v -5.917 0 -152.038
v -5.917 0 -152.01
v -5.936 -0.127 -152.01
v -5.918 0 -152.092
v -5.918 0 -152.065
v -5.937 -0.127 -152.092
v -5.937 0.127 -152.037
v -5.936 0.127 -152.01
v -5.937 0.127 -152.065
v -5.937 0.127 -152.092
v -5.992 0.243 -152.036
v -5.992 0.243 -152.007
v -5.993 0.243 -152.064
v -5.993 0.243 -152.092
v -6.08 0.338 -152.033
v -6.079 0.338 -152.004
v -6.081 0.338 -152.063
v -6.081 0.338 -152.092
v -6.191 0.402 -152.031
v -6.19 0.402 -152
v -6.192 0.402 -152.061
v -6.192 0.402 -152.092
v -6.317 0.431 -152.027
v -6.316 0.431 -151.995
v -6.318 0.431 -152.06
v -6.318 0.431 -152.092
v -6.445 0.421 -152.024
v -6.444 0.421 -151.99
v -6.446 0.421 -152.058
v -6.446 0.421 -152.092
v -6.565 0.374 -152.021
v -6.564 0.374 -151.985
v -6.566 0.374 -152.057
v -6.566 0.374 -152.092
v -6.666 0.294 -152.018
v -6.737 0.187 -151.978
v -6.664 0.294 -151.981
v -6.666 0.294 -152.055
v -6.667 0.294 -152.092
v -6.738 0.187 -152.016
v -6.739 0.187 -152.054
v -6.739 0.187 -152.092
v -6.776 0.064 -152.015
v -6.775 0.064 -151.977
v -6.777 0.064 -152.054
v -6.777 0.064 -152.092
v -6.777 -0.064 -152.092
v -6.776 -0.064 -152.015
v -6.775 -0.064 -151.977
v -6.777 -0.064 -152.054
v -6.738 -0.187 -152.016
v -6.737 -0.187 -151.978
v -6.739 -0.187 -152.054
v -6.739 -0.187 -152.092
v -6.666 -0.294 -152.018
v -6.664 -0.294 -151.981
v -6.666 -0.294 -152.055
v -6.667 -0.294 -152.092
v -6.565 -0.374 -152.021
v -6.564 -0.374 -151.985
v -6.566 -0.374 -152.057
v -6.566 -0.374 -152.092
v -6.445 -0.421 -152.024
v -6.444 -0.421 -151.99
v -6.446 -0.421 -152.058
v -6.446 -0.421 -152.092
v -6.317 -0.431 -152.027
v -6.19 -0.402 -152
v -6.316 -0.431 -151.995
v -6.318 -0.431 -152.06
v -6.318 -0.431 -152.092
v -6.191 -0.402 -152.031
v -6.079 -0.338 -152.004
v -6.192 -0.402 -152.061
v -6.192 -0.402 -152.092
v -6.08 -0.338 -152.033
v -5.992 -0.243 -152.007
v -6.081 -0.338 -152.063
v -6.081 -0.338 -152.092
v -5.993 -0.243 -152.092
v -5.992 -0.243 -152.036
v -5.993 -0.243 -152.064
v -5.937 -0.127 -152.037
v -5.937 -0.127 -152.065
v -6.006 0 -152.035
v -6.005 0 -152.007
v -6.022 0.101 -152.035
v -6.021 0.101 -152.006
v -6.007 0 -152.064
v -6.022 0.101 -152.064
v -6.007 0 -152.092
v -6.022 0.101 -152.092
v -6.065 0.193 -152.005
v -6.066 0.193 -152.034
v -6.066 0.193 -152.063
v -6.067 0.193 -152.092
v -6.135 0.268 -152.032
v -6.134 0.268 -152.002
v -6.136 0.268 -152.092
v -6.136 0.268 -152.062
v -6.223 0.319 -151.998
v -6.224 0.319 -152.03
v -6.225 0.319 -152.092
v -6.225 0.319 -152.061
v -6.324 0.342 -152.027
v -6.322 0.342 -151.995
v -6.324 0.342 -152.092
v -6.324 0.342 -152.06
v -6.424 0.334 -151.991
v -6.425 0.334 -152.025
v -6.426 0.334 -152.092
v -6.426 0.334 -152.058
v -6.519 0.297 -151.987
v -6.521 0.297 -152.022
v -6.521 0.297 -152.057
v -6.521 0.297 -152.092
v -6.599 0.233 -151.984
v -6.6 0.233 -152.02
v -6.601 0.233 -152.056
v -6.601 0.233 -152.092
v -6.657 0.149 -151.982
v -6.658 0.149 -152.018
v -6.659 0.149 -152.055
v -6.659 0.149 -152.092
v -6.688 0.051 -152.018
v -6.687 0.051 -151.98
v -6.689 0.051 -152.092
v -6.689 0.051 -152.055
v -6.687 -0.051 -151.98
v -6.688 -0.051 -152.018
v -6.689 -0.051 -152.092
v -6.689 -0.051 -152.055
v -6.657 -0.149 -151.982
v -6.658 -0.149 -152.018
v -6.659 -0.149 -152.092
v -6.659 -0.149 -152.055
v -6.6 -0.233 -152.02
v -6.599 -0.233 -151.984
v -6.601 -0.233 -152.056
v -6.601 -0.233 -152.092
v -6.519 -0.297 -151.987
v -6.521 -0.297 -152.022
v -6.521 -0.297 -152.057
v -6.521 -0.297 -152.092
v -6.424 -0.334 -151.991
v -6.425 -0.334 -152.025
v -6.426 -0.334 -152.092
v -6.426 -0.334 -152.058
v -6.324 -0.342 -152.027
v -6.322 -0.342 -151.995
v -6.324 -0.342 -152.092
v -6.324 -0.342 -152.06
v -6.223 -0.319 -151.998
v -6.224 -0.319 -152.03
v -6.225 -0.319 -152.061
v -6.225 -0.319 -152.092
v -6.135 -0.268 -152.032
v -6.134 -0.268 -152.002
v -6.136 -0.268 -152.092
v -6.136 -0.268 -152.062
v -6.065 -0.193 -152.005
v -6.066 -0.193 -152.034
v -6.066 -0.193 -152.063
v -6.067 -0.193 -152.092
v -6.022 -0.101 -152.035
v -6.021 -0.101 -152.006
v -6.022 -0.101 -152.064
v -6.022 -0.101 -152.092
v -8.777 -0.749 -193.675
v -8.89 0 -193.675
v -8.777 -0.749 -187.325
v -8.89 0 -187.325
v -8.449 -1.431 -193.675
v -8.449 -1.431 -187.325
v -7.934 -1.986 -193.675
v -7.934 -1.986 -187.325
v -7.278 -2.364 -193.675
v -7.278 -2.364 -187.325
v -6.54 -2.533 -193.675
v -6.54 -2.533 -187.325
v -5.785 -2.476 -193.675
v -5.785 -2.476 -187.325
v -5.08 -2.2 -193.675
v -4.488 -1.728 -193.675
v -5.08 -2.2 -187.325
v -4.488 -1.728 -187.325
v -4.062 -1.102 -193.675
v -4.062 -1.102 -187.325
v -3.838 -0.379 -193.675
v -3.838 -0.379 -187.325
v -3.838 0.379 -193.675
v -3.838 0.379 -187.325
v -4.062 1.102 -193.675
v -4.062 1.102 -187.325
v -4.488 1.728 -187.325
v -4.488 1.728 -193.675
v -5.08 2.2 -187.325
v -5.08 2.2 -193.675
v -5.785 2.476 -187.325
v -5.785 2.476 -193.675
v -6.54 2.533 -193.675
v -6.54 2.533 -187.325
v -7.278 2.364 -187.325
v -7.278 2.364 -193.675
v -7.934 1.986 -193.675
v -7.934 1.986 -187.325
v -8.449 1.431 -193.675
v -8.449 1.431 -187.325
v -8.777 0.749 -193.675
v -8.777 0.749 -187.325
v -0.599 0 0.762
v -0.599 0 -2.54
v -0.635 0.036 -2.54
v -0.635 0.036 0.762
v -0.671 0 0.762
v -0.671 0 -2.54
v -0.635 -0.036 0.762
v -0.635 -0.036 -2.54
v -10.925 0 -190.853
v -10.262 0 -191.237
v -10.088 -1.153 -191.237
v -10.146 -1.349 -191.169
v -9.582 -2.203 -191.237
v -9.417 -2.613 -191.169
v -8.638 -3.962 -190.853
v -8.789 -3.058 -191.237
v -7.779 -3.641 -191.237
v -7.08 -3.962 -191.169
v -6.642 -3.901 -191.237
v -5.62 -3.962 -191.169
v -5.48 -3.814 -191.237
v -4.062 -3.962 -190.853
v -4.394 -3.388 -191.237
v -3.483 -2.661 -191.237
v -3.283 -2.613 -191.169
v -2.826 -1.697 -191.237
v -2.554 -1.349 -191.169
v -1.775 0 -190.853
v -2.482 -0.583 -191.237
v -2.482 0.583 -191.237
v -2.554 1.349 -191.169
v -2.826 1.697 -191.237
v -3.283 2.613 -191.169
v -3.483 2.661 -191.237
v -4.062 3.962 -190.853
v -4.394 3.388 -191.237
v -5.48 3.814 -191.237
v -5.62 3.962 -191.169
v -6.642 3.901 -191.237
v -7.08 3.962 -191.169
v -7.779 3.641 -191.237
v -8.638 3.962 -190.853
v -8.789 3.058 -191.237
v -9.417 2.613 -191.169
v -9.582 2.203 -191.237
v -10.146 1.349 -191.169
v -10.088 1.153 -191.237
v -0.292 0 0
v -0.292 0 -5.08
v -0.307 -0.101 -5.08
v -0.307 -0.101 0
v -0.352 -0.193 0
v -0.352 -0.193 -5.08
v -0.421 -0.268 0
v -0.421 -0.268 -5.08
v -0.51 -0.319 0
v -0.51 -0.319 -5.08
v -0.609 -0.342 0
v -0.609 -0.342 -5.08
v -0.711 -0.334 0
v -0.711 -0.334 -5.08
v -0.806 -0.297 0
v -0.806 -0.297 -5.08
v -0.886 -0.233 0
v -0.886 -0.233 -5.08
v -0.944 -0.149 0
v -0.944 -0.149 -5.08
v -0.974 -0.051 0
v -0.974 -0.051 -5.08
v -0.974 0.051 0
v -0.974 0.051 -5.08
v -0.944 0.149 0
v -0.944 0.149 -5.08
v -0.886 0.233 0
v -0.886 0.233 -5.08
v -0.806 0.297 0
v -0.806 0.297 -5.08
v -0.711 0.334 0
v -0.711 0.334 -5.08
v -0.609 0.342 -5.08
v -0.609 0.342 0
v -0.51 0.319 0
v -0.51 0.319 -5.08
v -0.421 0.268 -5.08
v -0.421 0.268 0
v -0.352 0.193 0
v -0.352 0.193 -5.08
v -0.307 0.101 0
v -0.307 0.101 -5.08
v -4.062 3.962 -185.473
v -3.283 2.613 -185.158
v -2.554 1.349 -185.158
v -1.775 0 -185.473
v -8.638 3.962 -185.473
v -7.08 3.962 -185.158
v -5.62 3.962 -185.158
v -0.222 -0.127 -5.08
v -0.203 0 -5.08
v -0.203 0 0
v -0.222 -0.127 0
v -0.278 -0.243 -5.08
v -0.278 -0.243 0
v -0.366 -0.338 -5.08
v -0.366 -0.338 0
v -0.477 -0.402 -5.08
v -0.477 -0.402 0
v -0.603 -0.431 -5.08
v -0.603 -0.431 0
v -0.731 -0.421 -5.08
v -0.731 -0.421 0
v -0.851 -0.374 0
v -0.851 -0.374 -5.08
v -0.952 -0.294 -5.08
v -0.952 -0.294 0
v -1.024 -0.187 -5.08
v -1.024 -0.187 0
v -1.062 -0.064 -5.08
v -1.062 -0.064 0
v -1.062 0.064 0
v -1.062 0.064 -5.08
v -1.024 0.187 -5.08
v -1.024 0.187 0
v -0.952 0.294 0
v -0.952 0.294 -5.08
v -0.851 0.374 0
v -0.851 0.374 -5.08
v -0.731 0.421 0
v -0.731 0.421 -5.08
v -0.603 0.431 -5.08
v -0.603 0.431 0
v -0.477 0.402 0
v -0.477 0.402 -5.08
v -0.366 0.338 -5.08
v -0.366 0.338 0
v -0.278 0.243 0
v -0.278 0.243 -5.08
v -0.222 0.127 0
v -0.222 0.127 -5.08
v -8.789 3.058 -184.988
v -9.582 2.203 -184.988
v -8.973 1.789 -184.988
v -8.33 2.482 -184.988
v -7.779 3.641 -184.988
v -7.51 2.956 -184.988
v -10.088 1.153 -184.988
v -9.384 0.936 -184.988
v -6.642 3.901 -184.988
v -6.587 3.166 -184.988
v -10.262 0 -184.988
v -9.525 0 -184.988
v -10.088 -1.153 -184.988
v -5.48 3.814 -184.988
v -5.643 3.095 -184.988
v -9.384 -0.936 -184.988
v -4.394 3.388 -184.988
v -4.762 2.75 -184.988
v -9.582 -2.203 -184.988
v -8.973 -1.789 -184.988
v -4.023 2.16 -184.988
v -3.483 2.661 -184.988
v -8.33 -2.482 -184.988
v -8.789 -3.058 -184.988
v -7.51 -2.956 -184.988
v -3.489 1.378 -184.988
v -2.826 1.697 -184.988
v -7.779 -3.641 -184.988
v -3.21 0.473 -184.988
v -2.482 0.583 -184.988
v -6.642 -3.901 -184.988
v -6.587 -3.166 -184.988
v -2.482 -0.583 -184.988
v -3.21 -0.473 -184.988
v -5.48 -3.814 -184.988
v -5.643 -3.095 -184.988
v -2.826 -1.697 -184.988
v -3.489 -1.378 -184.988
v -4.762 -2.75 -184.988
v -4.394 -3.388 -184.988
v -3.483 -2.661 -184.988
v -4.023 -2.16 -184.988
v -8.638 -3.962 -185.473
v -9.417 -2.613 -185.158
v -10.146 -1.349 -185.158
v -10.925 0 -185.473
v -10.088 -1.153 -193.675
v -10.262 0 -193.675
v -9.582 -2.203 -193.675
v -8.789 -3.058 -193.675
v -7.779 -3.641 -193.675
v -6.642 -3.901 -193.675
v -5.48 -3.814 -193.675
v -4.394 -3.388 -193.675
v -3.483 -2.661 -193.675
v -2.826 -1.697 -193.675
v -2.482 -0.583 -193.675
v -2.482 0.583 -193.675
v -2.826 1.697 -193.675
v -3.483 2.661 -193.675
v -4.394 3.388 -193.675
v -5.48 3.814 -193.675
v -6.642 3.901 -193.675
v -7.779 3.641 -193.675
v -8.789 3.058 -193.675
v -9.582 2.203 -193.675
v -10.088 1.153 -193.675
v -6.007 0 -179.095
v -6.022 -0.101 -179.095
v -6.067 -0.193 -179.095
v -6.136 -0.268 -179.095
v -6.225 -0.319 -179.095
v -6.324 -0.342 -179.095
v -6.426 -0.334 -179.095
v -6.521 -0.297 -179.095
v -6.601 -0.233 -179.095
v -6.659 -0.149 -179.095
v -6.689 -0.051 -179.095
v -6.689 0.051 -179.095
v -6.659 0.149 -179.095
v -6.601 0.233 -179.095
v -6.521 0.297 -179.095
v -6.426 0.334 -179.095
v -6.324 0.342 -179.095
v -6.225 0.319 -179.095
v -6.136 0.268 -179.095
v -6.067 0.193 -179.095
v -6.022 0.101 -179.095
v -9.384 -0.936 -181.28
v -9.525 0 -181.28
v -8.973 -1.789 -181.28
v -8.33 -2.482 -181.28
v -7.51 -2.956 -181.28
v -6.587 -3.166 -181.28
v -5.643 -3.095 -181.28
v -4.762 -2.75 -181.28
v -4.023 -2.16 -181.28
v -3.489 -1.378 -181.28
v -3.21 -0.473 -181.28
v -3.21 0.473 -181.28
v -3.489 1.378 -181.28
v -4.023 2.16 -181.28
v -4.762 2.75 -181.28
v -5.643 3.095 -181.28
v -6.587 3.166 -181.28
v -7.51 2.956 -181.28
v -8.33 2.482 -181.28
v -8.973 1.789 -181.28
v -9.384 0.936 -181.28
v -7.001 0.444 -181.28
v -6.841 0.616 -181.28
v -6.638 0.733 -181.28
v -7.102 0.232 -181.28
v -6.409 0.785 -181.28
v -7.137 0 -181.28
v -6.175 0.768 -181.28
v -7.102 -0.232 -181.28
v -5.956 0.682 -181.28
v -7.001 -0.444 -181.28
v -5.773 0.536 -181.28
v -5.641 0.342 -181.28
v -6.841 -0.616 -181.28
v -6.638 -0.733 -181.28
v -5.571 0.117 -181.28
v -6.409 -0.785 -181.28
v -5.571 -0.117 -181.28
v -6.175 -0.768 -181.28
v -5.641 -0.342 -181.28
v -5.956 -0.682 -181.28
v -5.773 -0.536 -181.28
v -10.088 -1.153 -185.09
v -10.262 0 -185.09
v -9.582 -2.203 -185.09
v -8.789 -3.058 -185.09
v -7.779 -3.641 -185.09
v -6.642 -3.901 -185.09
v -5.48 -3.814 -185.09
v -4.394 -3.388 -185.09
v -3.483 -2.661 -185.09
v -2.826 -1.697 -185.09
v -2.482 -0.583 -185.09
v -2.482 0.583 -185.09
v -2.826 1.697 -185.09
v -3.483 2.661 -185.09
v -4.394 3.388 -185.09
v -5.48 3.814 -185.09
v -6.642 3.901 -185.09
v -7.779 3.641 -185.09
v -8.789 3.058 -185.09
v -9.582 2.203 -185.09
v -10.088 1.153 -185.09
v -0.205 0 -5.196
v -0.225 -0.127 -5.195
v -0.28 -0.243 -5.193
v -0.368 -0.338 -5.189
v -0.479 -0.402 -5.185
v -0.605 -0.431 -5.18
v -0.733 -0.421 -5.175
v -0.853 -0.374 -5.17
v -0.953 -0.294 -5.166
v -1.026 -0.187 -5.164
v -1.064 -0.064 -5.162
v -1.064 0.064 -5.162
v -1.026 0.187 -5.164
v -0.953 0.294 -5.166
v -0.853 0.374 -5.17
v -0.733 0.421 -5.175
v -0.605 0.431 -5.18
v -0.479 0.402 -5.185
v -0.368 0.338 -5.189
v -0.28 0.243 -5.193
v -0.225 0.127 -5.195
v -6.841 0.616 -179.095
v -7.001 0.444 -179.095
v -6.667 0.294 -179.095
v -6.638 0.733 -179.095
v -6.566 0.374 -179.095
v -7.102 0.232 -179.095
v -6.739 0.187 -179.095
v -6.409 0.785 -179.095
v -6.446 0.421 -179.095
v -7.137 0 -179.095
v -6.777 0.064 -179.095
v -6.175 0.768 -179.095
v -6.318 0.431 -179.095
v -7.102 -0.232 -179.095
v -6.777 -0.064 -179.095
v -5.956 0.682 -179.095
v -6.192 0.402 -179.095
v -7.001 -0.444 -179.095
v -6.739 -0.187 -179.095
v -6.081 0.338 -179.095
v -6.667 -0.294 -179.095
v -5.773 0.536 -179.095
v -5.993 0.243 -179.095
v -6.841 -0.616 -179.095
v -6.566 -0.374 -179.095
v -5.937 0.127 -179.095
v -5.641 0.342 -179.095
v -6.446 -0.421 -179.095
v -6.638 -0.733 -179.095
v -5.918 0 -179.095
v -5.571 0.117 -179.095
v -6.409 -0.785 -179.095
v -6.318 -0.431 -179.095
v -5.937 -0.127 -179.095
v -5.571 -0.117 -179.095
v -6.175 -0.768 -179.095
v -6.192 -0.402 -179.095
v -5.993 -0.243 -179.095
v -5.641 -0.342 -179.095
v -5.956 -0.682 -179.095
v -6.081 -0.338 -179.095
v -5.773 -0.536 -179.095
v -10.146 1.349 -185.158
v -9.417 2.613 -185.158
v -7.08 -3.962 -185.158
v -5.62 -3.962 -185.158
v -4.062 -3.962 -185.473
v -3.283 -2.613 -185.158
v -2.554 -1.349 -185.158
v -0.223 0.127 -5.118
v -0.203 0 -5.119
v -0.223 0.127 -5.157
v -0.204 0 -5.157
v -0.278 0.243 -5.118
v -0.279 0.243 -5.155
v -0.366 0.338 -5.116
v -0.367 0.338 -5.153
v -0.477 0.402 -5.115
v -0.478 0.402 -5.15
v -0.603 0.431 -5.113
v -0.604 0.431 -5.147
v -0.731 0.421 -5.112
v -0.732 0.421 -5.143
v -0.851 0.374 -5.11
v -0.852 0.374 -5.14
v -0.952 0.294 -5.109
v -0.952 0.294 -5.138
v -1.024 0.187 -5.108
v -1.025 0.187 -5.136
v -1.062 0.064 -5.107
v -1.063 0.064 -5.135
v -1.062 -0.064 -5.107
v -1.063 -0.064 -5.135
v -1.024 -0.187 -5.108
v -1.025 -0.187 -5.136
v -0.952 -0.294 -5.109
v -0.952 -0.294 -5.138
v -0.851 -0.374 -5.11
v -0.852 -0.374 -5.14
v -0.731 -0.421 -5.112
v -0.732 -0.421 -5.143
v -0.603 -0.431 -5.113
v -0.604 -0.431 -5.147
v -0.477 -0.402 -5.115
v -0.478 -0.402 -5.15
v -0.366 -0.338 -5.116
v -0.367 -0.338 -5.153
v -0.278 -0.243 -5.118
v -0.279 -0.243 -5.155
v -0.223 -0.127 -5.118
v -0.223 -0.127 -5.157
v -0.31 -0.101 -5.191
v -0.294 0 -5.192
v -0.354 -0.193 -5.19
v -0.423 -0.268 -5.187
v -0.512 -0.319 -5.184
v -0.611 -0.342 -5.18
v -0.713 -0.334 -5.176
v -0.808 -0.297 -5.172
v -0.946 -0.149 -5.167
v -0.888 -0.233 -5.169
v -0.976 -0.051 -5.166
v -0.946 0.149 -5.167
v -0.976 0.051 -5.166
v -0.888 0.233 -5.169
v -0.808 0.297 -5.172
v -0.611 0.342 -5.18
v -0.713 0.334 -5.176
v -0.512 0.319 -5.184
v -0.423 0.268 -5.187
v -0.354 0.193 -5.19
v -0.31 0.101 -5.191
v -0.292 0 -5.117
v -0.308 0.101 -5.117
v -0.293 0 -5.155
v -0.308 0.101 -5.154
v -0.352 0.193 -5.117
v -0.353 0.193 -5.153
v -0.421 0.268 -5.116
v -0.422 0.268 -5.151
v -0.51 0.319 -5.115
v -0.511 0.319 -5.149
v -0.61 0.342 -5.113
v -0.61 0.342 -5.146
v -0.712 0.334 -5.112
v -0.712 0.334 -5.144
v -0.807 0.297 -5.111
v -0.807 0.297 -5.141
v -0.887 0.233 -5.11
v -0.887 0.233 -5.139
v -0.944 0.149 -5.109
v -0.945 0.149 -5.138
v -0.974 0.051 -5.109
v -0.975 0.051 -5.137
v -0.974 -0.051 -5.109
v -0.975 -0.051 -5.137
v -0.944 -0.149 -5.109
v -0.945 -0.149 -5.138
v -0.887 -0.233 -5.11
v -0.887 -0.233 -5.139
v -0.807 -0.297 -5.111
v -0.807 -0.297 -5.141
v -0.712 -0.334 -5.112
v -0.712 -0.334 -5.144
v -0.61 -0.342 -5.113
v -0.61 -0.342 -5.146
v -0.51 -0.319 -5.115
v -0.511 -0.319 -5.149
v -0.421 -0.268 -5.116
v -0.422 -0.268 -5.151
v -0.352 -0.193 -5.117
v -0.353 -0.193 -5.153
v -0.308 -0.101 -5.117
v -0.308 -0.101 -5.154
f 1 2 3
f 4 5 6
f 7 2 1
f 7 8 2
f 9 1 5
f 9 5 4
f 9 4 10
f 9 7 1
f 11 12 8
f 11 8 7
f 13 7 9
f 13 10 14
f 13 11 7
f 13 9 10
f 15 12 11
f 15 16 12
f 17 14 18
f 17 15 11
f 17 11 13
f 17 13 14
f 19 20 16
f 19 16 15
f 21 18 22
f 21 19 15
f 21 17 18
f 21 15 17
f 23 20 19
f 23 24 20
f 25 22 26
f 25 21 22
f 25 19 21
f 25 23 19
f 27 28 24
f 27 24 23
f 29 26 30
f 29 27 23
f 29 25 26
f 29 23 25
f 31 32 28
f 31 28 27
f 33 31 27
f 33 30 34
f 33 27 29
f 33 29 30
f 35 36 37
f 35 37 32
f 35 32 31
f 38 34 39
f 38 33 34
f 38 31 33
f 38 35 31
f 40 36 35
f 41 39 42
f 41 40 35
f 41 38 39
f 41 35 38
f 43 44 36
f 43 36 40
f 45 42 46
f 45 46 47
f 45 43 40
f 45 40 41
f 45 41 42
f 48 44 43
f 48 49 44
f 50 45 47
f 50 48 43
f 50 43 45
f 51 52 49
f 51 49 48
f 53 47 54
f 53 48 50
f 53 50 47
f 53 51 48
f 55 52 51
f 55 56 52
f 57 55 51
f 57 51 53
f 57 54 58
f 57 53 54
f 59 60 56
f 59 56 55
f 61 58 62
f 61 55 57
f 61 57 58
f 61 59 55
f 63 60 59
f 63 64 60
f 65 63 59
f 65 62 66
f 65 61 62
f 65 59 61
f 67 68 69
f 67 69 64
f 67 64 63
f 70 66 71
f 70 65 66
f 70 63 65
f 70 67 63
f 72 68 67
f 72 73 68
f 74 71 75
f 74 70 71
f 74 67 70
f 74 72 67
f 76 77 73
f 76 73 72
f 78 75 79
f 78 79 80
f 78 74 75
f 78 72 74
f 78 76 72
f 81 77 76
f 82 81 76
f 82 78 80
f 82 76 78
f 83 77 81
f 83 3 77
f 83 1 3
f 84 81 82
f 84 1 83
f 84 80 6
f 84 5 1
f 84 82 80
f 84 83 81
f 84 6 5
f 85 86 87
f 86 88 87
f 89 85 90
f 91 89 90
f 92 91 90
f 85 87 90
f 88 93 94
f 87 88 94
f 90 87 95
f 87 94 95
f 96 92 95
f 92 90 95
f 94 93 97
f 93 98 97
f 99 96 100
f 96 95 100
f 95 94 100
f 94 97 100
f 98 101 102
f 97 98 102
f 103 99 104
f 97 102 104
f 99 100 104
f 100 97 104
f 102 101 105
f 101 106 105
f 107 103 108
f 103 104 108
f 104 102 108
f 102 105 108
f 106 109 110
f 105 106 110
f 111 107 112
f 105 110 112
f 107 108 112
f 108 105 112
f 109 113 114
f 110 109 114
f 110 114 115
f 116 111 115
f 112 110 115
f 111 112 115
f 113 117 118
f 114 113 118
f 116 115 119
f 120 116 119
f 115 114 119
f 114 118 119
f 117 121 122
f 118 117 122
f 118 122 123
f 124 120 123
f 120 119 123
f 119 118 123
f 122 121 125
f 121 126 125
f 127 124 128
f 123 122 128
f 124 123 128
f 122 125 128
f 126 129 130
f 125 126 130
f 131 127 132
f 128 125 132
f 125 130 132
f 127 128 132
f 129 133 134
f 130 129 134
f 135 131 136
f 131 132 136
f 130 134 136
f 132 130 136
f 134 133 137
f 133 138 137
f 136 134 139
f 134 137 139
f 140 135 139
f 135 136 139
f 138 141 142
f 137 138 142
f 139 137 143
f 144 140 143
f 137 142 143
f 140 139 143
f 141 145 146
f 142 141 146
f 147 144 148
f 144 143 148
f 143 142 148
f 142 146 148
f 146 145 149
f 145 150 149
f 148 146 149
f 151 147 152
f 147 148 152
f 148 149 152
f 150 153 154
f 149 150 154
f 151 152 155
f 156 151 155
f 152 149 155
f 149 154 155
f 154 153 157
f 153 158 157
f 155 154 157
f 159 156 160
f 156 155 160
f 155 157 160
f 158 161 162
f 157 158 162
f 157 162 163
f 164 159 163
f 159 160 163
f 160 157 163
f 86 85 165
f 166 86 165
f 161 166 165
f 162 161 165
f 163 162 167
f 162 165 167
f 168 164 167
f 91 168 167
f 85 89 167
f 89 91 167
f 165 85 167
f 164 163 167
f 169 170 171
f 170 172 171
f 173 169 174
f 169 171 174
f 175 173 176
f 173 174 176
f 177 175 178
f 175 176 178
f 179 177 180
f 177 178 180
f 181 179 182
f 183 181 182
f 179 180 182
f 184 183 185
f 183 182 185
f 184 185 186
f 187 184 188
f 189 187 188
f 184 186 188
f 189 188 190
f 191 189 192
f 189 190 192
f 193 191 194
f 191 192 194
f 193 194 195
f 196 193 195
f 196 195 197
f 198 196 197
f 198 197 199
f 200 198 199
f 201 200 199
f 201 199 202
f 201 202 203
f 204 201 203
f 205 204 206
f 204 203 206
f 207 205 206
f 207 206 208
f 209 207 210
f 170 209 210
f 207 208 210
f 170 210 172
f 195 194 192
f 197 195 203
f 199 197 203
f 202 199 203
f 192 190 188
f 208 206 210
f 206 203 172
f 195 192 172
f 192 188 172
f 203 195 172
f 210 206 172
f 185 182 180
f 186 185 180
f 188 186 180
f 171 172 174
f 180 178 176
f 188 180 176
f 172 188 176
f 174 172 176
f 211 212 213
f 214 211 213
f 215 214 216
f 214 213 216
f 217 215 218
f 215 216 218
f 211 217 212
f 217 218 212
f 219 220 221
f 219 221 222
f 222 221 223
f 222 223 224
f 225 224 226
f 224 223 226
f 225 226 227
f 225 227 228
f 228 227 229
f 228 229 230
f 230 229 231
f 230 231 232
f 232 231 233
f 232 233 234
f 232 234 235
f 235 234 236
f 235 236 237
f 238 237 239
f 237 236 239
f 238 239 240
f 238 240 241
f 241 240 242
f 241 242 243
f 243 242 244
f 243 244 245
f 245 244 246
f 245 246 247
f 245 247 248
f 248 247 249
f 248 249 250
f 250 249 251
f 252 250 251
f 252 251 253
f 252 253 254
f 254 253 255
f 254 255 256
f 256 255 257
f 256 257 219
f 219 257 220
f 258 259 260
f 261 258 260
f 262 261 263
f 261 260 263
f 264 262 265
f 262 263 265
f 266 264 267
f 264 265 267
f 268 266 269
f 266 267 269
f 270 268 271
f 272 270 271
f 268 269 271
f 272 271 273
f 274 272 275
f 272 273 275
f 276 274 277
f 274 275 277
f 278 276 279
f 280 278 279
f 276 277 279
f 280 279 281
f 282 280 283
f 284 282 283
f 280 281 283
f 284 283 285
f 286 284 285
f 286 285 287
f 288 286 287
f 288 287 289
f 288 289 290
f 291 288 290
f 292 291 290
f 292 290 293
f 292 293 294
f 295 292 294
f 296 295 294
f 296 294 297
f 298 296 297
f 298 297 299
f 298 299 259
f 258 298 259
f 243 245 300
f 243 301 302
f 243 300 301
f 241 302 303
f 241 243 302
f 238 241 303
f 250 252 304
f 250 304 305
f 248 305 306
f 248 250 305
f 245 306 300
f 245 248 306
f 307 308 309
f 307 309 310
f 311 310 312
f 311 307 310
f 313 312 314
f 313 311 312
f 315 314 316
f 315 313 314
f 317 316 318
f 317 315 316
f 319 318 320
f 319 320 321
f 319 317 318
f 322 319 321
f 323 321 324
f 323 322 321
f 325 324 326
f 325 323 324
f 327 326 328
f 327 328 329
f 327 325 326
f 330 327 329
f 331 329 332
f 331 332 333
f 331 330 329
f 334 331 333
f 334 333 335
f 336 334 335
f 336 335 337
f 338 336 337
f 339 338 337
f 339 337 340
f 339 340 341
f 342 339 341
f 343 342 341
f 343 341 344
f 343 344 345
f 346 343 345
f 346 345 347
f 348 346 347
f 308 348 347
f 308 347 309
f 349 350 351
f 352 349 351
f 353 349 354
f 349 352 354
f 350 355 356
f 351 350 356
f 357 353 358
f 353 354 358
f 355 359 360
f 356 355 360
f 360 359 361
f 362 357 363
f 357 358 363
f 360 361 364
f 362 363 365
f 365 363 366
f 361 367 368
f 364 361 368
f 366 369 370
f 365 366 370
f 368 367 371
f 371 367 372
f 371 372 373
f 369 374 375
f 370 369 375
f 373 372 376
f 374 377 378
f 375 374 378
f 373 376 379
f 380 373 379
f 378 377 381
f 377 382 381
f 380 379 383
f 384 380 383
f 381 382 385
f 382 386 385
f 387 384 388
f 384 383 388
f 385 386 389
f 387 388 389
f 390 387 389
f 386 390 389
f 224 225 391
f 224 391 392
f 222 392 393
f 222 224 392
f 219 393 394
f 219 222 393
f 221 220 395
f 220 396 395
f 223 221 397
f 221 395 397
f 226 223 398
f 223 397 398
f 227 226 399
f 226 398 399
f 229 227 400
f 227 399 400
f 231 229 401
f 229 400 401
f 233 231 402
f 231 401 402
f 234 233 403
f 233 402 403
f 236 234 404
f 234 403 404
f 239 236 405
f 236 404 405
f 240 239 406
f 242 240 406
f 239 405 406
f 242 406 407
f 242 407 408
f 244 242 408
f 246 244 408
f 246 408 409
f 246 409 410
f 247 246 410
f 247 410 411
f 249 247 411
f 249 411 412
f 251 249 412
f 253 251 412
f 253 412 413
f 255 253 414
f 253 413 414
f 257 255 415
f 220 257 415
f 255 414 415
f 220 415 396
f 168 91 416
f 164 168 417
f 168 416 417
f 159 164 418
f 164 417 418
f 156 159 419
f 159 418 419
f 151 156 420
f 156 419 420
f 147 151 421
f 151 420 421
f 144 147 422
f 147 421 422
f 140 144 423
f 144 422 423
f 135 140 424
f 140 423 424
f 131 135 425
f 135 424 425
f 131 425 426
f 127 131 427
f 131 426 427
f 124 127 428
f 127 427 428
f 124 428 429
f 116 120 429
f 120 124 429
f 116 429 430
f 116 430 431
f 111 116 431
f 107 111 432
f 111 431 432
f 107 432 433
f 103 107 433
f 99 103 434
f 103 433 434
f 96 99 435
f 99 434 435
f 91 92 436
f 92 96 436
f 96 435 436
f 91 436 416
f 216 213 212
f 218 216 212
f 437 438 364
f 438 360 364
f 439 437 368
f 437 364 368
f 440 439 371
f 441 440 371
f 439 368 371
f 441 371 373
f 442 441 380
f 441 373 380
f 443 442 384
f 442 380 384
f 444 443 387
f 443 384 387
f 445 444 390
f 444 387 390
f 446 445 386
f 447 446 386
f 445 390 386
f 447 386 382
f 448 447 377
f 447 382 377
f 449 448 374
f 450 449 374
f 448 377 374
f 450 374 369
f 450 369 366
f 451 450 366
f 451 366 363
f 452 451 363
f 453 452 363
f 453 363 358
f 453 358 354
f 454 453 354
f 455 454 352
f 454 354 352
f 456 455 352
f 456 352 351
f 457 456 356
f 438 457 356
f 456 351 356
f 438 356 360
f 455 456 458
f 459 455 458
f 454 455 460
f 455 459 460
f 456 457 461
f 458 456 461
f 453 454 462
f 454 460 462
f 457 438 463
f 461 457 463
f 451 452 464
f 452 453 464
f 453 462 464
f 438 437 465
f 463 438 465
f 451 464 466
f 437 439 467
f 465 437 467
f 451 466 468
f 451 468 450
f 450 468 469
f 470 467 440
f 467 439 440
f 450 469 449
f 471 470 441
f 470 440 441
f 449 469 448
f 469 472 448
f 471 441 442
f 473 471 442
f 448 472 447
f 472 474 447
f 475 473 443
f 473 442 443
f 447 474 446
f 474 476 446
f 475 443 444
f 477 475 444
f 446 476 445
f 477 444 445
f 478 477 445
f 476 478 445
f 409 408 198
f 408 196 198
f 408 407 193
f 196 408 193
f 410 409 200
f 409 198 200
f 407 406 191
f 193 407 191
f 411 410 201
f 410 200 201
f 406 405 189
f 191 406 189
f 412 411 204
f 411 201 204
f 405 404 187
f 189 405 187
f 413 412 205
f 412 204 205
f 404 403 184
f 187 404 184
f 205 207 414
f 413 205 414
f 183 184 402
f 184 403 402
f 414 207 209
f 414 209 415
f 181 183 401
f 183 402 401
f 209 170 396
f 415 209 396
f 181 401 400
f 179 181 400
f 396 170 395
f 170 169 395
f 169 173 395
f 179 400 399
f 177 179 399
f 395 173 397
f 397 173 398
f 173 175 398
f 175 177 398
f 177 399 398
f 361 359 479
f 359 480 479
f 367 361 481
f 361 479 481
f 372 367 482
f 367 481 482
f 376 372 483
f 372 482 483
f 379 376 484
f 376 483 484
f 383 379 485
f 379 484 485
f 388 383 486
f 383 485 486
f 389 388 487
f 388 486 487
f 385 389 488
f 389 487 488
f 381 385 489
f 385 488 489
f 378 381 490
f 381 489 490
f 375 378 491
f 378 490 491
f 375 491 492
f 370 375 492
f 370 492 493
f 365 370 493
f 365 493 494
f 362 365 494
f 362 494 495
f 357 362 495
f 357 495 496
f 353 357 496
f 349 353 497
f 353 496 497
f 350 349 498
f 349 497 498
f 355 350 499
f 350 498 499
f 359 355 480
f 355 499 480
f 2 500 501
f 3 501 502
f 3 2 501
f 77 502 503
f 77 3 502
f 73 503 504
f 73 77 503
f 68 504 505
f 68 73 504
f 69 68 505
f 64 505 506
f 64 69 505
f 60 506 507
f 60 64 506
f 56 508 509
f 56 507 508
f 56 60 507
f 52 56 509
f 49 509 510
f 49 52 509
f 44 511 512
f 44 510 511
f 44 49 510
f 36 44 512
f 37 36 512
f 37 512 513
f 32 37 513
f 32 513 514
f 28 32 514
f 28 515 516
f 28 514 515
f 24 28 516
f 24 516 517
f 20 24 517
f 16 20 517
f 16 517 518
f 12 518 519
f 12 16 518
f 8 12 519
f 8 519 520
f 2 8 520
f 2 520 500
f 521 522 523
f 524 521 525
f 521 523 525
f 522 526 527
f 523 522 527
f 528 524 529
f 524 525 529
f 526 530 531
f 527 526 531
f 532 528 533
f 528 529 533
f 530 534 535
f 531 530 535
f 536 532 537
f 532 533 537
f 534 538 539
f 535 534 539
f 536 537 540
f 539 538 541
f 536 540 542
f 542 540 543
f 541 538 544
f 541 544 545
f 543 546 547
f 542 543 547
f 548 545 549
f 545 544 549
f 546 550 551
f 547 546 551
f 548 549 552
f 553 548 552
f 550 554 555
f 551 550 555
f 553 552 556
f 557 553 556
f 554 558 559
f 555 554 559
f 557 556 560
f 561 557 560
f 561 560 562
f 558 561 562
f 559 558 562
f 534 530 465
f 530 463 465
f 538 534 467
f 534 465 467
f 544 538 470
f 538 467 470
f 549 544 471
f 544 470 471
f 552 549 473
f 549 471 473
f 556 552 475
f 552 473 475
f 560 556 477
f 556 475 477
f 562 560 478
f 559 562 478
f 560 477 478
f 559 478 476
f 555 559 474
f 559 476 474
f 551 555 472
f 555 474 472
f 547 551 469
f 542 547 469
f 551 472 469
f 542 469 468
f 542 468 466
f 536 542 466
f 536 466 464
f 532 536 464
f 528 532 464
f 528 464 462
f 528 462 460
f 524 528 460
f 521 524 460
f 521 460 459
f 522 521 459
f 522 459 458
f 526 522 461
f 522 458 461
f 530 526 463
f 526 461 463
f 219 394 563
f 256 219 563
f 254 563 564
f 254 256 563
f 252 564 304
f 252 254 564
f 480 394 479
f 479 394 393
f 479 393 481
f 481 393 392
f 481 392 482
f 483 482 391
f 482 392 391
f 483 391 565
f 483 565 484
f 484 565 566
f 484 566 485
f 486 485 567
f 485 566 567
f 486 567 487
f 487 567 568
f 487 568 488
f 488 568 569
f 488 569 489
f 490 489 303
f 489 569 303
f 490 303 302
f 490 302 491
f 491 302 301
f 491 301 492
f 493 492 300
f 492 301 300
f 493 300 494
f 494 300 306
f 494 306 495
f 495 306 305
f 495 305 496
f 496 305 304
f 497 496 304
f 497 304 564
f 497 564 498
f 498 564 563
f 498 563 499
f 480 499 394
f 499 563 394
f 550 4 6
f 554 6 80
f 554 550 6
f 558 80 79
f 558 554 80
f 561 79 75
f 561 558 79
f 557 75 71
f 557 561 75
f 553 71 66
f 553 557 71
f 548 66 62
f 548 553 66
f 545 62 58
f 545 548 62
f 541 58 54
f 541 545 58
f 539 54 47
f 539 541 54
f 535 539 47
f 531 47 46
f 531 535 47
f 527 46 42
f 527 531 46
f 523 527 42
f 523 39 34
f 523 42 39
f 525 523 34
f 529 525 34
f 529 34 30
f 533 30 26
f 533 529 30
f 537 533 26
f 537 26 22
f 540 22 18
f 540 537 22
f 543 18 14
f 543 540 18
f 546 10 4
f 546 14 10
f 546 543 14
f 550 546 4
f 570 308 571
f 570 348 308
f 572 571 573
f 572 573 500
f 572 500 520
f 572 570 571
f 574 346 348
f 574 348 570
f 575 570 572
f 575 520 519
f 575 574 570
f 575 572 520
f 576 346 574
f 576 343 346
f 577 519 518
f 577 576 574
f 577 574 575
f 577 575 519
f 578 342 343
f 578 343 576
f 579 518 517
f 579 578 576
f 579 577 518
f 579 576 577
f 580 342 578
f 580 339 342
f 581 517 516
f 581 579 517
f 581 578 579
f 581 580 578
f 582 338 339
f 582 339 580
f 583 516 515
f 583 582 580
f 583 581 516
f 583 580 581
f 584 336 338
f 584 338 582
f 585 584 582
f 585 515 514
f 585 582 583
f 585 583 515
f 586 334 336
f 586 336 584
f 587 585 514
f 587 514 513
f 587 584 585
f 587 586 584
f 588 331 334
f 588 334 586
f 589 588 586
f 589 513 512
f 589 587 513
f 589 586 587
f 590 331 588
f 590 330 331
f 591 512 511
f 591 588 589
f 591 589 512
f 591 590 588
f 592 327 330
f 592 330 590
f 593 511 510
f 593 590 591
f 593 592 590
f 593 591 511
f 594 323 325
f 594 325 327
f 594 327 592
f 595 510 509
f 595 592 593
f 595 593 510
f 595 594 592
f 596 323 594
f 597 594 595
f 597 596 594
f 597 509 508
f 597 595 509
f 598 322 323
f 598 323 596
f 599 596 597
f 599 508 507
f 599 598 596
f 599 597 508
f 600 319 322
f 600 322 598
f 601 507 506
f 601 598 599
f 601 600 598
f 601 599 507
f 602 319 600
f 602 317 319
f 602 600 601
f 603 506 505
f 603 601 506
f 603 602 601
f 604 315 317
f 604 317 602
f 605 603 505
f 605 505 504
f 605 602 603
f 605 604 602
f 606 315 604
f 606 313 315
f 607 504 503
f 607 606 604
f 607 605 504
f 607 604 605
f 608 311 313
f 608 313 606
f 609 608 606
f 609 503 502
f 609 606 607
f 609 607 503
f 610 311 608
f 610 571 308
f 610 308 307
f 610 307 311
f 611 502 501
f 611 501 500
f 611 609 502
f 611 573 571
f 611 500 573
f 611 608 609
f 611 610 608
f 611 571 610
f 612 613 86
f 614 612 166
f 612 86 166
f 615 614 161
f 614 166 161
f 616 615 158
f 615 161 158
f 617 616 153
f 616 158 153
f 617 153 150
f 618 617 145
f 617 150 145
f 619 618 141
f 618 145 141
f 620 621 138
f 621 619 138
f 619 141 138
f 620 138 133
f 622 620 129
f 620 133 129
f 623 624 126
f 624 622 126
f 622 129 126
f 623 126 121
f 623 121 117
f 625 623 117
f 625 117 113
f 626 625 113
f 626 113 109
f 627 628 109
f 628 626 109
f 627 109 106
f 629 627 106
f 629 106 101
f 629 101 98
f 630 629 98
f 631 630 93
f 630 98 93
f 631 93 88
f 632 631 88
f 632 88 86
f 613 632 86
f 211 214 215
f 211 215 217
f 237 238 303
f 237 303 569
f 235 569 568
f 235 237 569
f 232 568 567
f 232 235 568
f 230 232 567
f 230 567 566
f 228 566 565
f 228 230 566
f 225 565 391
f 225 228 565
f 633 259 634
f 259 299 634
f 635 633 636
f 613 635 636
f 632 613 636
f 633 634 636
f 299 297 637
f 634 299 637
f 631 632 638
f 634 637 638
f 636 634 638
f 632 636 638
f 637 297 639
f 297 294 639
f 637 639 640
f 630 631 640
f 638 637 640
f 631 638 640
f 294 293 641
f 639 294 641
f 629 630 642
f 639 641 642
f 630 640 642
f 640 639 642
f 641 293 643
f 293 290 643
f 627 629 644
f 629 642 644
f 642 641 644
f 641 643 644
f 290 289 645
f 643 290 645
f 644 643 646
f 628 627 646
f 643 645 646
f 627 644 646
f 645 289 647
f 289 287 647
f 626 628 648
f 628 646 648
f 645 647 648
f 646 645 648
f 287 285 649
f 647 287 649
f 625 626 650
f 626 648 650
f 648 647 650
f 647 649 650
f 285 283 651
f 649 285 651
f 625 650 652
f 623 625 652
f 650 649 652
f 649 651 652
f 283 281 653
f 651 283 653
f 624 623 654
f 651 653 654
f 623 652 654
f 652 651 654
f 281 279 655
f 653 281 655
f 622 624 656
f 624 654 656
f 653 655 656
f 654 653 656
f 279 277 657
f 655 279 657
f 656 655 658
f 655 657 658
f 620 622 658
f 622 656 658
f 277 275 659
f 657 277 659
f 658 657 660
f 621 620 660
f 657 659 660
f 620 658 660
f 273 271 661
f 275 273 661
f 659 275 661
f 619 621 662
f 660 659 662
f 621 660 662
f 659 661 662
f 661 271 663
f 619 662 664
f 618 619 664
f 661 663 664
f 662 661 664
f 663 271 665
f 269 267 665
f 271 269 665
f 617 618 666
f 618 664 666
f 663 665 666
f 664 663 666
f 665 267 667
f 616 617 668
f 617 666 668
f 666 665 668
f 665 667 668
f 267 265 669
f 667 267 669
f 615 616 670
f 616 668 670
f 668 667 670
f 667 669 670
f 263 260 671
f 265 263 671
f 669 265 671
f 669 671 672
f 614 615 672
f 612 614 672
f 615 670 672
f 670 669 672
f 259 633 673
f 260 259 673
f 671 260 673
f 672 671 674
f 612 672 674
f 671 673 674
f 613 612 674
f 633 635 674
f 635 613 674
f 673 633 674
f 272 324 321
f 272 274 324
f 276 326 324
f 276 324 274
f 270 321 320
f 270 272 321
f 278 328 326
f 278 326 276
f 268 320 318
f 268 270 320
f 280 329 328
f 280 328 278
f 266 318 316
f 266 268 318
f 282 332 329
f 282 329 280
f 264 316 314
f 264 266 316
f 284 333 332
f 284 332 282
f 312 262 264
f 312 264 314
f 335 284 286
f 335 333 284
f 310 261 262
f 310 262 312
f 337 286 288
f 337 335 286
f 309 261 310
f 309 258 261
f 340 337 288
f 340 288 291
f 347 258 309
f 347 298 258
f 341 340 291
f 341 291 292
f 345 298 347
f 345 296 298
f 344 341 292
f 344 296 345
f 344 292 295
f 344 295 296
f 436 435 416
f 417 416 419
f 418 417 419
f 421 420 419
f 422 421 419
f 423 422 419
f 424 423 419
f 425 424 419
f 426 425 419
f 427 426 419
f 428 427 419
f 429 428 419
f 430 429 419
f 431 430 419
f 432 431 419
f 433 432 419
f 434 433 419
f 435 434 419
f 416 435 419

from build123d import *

# Parameters (mm, degrees)
SKETCH1_R                     = 0.4318000000000002
SKETCH1_R_2                   = 0.3429000000000006
CE_00_CONNECTOR_HEX_CUT_REACH = 196.066
SKETCH4_R                     = 5.293177826238989
BE_00_PIN_LNA_END_DEPTH       = 0.762
BE_00_PIN_LNA_END_DEPTH_BACK  = 2.54
SKETCH5_R                     = 0.03555999999999999


with BuildPart() as part:
    # SW-00 Jacket & Layout: sweep along a path in Sketch2
    with BuildLine(Plane(origin=(0, 0, 0), x_dir=(1, 0, 0), z_dir=(0, 1, 0))) as sw_00_jacket_layout_path:
        Line((-0.635, 0), (-0.635, 5.08))
        ThreePointArc((-0.635, 5.08), (-0.6354799554172685, 5.129375532022666), (-0.6369196402854498, 5.178732404160234))
        Line((-0.6369196402854498, 5.178732404160234), (-6.348080359714551, 151.99360009067468))
        ThreePointArc((-6.348080359714551, 151.99360009067468), (-6.349520044582732, 152.04295696281224), (-6.35, 152.0923324948349))
        Line((-6.35, 152.0923324948349), (-6.349999999999999, 181.27980002776076))
    # Sketch1 → SW-00 Jacket & Layout (sweep)
    with BuildSketch(Plane.XY):
        with Locations((-0.635, 0)):
            Circle(SKETCH1_R)
        with Locations((-0.635, 0)):
            Circle(SKETCH1_R_2, mode=Mode.SUBTRACT)
    sweep(path=sw_00_jacket_layout_path.line)

    # Sketch3 → BR-00 Connector Body (revolve)
    with BuildSketch(Plane(origin=(0, 0, 0), x_dir=(1, 0, 0), z_dir=(0, 1, 0)), mode=Mode.PRIVATE) as br_00_connector_body_sk:
        Polygon((-6.349999999999998, 179.09539999999998), (-5.562599999999998, 179.09539999999998), (-5.562599999999998, 181.2798), (-3.174999999999998, 181.2798), (-3.174999999999998, 184.98819999999998), (-2.4383999999999992, 184.98819999999998), (-2.4383999999999992, 185.08979999999997), (-1.4223999999999994, 185.67638787349662), (-1.4223999999999994, 190.65001212650333), (-2.4383999999999997, 191.23659999999998), (-2.4384, 193.67499999999998), (-3.8099999999999996, 193.67499999999998), (-3.8099999999999987, 187.325), (-6.349999999999999, 187.325), align=None)
    revolve(br_00_connector_body_sk.sketch.rotate(Axis((-6.349999999999999, 0, -187.325), (1.2e-16, 0, 1)), 180), axis=Axis((-6.349999999999999, 0, -187.325), (1.2e-16, 0, 1)))

    # CE-00 Connector Hex Cut: up to this cone (the profile starts inside it)
    ce_00_connector_hex_cut_end = Plane(origin=(-6.35, 0, -193.675), z_dir=(-1.2e-16, 0, -1)).offset(-10.843562312962199) * Cone(1.732050805e-06, 391.7745915726082, 226.1911649061025, align=(Align.CENTER, Align.CENTER, Align.MIN), mode=Mode.PRIVATE)
    # Sketch4 → CE-00 Connector Hex Cut (cut, up to the surface)
    with BuildSketch(Plane(origin=(-2.295e-14, 0, -193.67499999999998), x_dir=(-1, 0, 0), z_dir=(0, 0, -1)), mode=Mode.PRIVATE) as ce_00_connector_hex_cut_sk1:
        with Locations((6.349999999999954, 0)):
            Circle(SKETCH4_R)
        Polygon((10.925385413273895, -2.6e-15), (8.637692706636924, 3.9623999999999953), (4.062307293362984, 3.962399999999996), (1.7746145867260137, -3.6e-16), (4.062307293362983, -3.962399999999996), (8.637692706636926, -3.962399999999997), align=None, mode=Mode.SUBTRACT)
    ce_00_connector_hex_cut_tool1 = extrude(ce_00_connector_hex_cut_sk1.sketch, amount=-CE_00_CONNECTOR_HEX_CUT_REACH, mode=Mode.PRIVATE) & ce_00_connector_hex_cut_end
    add(ce_00_connector_hex_cut_tool1.solids().sort_by_distance((-1.206536, 0, -193.675))[0], mode=Mode.SUBTRACT)


with BuildPart() as body_2:
    # Sketch5 → BE-00 Pin LNA End (new, two sides: drawn at the far end of the back side and taken through both)
    with BuildSketch(Plane.XY.offset(-BE_00_PIN_LNA_END_DEPTH_BACK)):
        with Locations((-0.635, 0)):
            Circle(SKETCH5_R)
    extrude(amount=BE_00_PIN_LNA_END_DEPTH + BE_00_PIN_LNA_END_DEPTH_BACK)


solid = Compound([part.part, body_2.part])
